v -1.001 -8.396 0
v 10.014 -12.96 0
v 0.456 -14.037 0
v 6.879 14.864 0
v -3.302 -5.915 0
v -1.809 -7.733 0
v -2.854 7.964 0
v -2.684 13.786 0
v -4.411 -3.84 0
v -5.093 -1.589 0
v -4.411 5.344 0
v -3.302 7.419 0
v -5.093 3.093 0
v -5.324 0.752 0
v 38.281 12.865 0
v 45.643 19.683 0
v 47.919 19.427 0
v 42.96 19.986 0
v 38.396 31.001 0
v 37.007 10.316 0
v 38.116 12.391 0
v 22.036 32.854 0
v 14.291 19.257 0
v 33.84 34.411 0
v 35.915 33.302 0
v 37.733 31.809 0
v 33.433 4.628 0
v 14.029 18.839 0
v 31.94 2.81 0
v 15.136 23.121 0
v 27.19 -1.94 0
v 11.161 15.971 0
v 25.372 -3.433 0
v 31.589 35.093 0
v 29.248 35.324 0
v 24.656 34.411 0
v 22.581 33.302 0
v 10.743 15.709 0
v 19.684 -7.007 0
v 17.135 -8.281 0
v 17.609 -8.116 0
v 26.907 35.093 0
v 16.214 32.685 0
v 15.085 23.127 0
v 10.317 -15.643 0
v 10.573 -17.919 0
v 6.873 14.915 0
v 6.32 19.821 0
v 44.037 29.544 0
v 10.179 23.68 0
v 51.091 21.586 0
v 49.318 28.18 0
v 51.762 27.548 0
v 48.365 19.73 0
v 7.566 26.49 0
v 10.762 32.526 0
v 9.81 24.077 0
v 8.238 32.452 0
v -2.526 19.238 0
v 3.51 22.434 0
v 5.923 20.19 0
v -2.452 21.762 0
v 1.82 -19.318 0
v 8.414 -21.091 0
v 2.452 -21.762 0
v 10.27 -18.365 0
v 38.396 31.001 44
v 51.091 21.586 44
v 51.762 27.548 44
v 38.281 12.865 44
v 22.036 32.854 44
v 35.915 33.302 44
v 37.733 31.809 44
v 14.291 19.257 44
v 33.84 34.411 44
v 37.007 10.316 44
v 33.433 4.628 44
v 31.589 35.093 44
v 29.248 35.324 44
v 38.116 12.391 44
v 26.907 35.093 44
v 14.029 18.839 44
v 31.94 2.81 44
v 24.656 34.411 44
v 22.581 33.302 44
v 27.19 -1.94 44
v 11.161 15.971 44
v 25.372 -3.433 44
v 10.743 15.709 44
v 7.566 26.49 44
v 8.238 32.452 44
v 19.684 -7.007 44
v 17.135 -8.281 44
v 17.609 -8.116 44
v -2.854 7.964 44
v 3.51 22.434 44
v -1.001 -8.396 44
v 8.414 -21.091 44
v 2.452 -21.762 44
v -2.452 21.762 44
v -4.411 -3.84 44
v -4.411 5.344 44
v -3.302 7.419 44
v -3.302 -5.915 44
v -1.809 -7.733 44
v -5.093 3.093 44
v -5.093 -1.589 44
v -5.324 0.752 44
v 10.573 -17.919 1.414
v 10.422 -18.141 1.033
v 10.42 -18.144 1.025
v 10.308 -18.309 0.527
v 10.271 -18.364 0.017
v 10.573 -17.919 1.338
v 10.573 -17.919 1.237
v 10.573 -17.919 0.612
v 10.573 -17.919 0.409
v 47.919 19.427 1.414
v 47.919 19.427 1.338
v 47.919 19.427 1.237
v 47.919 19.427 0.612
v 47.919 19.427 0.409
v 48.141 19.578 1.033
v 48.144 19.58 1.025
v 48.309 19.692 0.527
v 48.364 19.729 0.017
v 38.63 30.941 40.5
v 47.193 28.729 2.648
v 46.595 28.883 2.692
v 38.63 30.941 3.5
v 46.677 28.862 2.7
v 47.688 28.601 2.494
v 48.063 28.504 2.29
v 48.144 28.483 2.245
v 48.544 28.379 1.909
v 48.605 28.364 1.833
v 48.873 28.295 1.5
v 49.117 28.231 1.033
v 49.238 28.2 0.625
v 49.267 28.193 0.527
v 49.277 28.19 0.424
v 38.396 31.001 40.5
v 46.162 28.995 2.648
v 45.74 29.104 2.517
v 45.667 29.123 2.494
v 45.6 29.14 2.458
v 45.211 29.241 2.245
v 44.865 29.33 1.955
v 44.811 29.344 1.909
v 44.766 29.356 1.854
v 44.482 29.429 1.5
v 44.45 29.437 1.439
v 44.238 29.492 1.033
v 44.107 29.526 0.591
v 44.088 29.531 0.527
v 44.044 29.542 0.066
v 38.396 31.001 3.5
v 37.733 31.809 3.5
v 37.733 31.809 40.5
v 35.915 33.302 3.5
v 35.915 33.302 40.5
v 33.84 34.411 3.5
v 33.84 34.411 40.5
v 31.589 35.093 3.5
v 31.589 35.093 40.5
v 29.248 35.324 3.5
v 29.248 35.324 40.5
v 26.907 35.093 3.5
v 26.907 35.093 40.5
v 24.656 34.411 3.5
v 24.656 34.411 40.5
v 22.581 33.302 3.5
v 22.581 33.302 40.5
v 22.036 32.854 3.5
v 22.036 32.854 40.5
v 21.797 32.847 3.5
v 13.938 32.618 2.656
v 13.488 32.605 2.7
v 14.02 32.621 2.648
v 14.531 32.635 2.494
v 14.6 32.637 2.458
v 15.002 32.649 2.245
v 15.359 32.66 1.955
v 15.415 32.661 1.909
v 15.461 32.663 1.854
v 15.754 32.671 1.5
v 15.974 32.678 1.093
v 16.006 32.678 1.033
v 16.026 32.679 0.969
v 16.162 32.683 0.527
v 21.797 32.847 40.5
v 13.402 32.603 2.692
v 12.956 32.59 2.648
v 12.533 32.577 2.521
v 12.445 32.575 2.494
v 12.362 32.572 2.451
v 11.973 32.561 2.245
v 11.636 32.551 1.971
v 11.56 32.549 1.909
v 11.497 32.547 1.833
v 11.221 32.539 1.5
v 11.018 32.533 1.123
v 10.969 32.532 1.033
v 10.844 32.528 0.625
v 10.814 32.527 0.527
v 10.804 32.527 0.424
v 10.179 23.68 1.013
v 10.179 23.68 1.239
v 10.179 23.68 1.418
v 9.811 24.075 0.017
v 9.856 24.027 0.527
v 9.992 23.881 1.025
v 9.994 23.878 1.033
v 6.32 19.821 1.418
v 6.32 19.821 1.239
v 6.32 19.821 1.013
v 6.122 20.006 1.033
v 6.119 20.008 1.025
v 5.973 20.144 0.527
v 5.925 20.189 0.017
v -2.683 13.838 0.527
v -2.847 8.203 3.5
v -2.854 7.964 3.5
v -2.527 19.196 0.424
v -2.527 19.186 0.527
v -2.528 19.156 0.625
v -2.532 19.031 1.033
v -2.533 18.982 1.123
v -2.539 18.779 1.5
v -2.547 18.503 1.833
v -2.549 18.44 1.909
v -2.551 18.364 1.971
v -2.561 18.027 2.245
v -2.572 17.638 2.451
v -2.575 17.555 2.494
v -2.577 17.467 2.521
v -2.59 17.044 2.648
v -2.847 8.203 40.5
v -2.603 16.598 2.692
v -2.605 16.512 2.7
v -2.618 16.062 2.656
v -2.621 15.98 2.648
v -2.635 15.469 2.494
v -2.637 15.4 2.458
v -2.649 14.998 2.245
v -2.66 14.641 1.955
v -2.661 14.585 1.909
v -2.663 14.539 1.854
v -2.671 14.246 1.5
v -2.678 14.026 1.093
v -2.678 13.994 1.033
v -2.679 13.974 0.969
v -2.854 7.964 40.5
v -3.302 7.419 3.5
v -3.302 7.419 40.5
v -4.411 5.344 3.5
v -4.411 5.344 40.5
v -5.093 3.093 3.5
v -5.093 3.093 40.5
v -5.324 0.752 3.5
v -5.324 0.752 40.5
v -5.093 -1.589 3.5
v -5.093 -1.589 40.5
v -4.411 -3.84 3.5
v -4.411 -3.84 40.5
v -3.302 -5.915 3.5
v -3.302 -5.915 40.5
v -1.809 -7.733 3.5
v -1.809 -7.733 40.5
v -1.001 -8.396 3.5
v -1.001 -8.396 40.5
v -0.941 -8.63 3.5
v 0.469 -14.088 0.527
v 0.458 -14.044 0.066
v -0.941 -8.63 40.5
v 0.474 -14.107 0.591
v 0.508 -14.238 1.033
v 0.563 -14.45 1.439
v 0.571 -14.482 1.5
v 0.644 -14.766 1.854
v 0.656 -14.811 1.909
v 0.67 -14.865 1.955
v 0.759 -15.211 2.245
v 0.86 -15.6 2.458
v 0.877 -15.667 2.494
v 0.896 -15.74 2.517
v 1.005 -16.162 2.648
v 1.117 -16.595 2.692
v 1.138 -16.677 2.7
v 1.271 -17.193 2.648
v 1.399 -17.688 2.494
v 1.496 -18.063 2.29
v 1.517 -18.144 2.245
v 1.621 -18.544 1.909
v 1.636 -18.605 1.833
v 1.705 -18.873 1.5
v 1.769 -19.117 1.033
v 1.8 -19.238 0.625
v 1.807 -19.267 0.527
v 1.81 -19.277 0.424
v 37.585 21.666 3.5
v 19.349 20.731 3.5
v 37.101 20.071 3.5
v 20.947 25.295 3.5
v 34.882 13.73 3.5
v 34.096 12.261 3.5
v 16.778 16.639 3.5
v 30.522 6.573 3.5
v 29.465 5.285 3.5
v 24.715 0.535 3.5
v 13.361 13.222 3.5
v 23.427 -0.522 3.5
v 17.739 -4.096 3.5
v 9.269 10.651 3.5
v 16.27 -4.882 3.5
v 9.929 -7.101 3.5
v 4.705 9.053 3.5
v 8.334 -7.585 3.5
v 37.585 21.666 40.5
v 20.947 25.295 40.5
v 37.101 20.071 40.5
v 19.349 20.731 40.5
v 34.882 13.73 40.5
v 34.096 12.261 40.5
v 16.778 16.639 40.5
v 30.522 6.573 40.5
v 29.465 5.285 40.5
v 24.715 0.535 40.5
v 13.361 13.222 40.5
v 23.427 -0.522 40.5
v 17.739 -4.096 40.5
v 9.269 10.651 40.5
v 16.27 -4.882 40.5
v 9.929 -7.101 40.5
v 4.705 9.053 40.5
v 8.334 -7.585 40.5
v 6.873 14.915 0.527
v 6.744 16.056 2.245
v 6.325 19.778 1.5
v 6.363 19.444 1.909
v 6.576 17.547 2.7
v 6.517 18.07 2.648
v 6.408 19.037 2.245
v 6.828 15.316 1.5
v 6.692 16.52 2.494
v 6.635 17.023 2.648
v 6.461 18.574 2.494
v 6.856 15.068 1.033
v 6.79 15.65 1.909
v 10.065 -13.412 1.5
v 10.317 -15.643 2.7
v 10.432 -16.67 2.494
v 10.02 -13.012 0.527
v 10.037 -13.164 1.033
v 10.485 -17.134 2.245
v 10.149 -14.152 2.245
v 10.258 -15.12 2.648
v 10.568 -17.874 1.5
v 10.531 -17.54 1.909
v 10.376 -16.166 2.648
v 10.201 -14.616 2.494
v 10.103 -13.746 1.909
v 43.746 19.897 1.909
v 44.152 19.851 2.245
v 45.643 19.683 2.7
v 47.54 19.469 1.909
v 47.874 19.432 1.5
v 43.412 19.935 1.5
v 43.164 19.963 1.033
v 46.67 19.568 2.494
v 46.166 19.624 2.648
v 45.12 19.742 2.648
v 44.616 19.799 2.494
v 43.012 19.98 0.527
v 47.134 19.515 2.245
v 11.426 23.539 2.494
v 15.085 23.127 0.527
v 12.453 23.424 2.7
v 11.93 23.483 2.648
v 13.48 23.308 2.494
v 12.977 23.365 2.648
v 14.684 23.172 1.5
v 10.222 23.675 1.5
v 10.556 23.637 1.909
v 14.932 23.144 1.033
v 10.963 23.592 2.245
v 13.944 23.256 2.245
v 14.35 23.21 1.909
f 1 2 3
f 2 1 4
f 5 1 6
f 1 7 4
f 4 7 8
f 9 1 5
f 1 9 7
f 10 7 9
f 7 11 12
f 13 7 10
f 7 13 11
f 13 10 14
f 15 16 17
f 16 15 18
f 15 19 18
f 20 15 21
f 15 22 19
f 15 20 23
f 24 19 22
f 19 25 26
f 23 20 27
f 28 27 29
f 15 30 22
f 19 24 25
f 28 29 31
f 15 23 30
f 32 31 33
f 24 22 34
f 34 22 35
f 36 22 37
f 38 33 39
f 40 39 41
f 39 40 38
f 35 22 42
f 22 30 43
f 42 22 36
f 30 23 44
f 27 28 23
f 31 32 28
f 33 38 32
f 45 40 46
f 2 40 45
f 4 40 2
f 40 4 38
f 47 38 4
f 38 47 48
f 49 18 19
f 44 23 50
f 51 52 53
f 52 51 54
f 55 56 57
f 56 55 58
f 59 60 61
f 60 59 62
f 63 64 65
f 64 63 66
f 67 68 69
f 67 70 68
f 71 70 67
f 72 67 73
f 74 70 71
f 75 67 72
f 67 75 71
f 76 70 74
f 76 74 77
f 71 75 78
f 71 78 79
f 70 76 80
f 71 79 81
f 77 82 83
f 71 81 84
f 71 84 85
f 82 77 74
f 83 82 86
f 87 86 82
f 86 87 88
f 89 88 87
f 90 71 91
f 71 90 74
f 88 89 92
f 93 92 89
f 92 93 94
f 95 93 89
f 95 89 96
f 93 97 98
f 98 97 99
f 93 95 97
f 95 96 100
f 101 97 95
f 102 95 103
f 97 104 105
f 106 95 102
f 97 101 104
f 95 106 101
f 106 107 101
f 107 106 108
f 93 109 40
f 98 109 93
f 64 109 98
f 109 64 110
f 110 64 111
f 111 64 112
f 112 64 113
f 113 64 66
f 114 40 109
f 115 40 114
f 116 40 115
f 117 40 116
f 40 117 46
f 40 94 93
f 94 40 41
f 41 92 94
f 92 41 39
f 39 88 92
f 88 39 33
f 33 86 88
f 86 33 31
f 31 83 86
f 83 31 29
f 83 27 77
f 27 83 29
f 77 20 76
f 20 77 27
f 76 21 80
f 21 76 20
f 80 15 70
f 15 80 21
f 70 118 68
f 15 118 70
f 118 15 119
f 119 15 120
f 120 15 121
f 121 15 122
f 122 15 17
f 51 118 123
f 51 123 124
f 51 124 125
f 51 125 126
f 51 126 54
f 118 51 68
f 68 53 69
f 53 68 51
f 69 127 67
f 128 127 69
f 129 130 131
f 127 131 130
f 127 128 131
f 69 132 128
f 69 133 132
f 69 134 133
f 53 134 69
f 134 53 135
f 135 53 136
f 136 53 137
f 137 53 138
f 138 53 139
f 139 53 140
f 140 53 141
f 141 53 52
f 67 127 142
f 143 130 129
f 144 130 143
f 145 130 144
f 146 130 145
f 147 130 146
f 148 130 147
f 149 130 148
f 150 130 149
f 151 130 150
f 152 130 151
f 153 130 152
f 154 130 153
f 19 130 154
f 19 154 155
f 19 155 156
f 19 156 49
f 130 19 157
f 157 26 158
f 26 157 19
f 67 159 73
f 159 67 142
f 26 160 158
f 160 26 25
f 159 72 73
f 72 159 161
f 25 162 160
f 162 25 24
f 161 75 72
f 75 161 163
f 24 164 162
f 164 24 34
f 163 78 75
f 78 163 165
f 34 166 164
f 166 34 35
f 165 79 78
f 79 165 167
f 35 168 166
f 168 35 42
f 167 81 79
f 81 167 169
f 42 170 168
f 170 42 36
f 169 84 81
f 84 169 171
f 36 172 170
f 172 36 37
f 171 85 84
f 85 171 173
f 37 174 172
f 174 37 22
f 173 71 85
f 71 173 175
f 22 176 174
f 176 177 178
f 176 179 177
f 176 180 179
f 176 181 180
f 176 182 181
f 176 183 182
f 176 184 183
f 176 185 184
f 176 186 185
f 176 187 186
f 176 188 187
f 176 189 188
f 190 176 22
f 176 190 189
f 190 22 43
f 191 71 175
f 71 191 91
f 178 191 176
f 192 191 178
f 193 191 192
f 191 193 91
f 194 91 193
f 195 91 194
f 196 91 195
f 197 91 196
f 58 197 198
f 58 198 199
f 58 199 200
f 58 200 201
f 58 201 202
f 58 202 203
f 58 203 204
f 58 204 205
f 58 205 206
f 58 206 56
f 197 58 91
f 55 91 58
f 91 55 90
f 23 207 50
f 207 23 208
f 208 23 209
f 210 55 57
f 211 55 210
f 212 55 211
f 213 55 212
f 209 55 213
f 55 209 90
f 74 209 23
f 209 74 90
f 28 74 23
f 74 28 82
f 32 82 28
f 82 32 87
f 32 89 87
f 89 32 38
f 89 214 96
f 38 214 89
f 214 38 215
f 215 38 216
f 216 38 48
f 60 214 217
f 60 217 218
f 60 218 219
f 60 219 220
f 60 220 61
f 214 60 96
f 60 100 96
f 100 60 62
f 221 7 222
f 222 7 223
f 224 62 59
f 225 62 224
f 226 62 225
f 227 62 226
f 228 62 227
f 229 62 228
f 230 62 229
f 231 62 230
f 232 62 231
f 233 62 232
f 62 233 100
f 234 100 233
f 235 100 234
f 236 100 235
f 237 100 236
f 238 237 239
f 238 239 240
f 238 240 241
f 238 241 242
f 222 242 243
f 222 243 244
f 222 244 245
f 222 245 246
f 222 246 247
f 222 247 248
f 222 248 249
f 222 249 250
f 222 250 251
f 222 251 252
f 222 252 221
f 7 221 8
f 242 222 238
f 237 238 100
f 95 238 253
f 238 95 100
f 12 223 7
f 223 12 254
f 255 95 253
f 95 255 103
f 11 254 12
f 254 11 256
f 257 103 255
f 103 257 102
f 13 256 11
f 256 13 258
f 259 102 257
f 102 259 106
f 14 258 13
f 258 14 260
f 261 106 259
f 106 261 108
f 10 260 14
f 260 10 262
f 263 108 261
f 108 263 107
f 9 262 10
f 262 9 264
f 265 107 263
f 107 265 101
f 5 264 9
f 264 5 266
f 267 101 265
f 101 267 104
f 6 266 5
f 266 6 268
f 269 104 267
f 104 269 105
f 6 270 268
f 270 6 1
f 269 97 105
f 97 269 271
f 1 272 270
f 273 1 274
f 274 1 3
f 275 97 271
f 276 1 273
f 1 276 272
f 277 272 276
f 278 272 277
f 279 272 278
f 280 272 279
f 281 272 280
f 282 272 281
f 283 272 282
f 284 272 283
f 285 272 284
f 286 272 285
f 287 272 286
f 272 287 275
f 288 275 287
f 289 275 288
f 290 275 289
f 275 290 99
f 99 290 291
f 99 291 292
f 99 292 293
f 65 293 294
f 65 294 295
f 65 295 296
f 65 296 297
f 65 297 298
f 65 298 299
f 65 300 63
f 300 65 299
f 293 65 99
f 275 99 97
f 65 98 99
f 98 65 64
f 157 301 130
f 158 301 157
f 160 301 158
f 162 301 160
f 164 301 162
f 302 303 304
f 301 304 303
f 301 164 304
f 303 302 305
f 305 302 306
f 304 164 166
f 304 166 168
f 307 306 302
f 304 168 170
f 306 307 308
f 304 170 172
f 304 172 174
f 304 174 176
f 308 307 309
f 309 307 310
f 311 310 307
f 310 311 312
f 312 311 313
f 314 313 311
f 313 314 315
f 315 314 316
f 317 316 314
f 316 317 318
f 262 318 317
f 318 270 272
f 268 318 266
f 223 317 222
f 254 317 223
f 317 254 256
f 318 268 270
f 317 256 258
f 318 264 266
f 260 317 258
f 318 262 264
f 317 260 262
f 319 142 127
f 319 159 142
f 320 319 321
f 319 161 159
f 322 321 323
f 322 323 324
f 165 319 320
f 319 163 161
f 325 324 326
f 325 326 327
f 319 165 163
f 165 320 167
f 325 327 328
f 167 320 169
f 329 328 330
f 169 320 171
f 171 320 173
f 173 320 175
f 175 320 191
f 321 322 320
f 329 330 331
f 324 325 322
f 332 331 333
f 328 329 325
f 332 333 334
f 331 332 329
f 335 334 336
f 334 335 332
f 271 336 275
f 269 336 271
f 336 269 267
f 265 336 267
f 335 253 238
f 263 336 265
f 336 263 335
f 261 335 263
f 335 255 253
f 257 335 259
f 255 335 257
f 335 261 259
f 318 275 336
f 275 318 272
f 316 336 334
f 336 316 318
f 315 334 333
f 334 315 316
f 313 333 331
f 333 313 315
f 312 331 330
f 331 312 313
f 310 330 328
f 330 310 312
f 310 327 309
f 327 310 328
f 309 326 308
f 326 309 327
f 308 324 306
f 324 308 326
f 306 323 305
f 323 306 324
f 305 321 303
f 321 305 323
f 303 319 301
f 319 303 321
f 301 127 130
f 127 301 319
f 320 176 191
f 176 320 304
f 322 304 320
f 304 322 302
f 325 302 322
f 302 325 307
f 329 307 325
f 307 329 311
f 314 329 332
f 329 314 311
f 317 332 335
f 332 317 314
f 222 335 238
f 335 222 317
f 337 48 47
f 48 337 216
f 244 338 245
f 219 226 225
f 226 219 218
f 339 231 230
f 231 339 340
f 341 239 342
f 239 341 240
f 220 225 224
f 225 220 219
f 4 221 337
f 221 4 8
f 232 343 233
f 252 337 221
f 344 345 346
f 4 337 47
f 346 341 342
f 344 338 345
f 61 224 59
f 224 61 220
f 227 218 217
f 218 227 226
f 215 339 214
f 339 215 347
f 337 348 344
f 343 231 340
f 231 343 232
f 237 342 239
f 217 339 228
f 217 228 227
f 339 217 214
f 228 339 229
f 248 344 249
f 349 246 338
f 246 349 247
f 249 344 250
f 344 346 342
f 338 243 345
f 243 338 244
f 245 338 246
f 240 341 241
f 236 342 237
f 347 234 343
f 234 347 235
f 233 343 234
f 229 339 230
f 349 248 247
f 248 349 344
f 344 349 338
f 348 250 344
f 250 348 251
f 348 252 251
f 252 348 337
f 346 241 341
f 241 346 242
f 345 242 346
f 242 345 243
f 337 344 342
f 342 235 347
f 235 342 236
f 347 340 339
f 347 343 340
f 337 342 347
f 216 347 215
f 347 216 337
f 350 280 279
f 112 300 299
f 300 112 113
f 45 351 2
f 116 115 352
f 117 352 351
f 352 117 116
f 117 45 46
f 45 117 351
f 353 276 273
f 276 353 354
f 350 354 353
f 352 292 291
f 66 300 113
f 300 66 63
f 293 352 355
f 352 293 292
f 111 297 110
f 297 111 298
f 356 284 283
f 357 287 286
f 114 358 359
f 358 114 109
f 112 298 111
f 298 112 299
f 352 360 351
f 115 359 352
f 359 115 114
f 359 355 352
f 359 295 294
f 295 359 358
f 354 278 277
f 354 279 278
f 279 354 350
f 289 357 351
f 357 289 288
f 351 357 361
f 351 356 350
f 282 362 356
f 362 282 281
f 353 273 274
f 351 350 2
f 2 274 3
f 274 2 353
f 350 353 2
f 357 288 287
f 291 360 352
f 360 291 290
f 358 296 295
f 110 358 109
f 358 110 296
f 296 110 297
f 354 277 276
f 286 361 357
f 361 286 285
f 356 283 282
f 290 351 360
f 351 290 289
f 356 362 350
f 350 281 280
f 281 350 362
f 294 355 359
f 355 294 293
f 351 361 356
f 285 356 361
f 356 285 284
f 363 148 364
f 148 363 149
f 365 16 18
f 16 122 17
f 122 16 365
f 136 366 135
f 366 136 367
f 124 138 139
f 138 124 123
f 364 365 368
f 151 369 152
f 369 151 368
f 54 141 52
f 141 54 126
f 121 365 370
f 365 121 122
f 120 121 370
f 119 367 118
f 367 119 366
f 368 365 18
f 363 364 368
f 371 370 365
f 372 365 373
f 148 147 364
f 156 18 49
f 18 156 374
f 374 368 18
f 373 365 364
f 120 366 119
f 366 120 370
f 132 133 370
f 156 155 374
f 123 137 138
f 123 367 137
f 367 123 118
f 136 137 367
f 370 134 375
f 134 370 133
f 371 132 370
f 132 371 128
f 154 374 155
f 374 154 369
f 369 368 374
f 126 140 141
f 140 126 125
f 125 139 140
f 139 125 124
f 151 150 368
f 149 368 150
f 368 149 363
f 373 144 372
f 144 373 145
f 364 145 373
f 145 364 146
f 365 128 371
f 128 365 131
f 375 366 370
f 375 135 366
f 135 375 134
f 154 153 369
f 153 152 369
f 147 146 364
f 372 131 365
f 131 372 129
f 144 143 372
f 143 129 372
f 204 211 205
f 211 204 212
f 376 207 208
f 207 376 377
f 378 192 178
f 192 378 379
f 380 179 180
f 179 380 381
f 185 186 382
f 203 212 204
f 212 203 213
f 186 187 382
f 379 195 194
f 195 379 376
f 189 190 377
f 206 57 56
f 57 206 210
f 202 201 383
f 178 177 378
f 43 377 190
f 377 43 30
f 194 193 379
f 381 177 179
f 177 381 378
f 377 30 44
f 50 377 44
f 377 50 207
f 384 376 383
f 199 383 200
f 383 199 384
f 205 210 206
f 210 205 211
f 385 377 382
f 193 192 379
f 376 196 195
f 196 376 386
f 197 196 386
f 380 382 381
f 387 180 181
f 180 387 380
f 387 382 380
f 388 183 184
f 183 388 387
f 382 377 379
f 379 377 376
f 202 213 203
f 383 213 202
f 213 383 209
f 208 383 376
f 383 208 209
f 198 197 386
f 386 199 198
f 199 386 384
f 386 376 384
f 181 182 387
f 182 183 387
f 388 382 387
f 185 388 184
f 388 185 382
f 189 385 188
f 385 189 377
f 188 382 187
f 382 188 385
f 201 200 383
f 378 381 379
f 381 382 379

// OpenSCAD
$fn = 32;

// ----------------------------------------------------------------------
// Air duct: 24 mm duct, 3.5 mm wall, 44 mm across
// ----------------------------------------------------------------------

// --- parameters (mm) ---
duct_r = 12;              // duct core radius
duct_d = 24;              // duct core diameter
wall = 3.5;               // duct wall thickness
height = 44;              // duct width (extrusion height)
port_r = 21.9;            // port flange half width
port_d = 43.8;            // port flange width
port_t = 6;               // port flange thickness
bolt_d = 5.4;             // port bolt holes
bolt_offset = 16.7;       // bolt hole offset from the port axis

difference() {
  /* outer hull chain: tube with a flat flange plate at every port */
  linear_extrude(height = 44) {
    hull() {
      polygon([[2.452, -21.762], [-2.452, 21.762], [3.51, 22.434], [8.414, -21.091]]);
      translate([8.943, 1.008]) circle(r = 12);
    }
    hull() {
      translate([8.943, 1.008]) circle(r = 12);
      translate([6.676, 0.752]) circle(r = 12);
    }
    hull() {
      translate([6.676, 0.752]) circle(r = 12);
      translate([13.017, 2.971]) circle(r = 12);
    }
    hull() {
      translate([13.017, 2.971]) circle(r = 12);
      translate([18.705, 6.545]) circle(r = 12);
    }
    hull() {
      translate([18.705, 6.545]) circle(r = 12);
      translate([23.455, 11.295]) circle(r = 12);
    }
    hull() {
      translate([23.455, 11.295]) circle(r = 12);
      translate([27.029, 16.983]) circle(r = 12);
    }
    hull() {
      translate([27.029, 16.983]) circle(r = 12);
      translate([29.248, 23.324]) circle(r = 12);
    }
    hull() {
      translate([29.248, 23.324]) circle(r = 12);
      translate([28.992, 21.057]) circle(r = 12);
    }
    hull() {
      translate([28.992, 21.057]) circle(r = 12);
      polygon([[8.238, 32.452], [51.762, 27.548], [51.091, 21.586], [7.566, 26.49]]);
    }
  }
  /* air passage: the same chain inset by the wall, 5 mm proud of the ports */
  translate([0, 0, 3.5]) linear_extrude(height = 37) {
    hull() {
      translate([-4.969, -0.56]) circle(r = 8.5);
      translate([6.676, 0.752]) circle(r = 8.5);
    }
    hull() {
      translate([6.676, 0.752]) circle(r = 8.5);
      translate([13.017, 2.971]) circle(r = 8.5);
    }
    hull() {
      translate([13.017, 2.971]) circle(r = 8.5);
      translate([18.705, 6.545]) circle(r = 8.5);
    }
    hull() {
      translate([18.705, 6.545]) circle(r = 8.5);
      translate([23.455, 11.295]) circle(r = 8.5);
    }
    hull() {
      translate([23.455, 11.295]) circle(r = 8.5);
      translate([27.029, 16.983]) circle(r = 8.5);
    }
    hull() {
      translate([27.029, 16.983]) circle(r = 8.5);
      translate([29.248, 23.324]) circle(r = 8.5);
    }
    hull() {
      translate([29.248, 23.324]) circle(r = 8.5);
      translate([30.56, 34.969]) circle(r = 8.5);
    }
  }
  translate([0, 0]) rotate([0, 0, -83.57]) translate([-16.7, -2.5]) rotate([-90, 0, 0]) cylinder(h = 11, d = 5.4);
  translate([0, 0]) rotate([0, 0, -83.57]) translate([16.7, -2.5]) rotate([-90, 0, 0]) cylinder(h = 11, d = 5.4);
  translate([30, 30]) rotate([0, 0, 173.57]) translate([-16.7, -2.5]) rotate([-90, 0, 0]) cylinder(h = 11, d = 5.4);
  translate([30, 30]) rotate([0, 0, 173.57]) translate([16.7, -2.5]) rotate([-90, 0, 0]) cylinder(h = 11, d = 5.4);
}
